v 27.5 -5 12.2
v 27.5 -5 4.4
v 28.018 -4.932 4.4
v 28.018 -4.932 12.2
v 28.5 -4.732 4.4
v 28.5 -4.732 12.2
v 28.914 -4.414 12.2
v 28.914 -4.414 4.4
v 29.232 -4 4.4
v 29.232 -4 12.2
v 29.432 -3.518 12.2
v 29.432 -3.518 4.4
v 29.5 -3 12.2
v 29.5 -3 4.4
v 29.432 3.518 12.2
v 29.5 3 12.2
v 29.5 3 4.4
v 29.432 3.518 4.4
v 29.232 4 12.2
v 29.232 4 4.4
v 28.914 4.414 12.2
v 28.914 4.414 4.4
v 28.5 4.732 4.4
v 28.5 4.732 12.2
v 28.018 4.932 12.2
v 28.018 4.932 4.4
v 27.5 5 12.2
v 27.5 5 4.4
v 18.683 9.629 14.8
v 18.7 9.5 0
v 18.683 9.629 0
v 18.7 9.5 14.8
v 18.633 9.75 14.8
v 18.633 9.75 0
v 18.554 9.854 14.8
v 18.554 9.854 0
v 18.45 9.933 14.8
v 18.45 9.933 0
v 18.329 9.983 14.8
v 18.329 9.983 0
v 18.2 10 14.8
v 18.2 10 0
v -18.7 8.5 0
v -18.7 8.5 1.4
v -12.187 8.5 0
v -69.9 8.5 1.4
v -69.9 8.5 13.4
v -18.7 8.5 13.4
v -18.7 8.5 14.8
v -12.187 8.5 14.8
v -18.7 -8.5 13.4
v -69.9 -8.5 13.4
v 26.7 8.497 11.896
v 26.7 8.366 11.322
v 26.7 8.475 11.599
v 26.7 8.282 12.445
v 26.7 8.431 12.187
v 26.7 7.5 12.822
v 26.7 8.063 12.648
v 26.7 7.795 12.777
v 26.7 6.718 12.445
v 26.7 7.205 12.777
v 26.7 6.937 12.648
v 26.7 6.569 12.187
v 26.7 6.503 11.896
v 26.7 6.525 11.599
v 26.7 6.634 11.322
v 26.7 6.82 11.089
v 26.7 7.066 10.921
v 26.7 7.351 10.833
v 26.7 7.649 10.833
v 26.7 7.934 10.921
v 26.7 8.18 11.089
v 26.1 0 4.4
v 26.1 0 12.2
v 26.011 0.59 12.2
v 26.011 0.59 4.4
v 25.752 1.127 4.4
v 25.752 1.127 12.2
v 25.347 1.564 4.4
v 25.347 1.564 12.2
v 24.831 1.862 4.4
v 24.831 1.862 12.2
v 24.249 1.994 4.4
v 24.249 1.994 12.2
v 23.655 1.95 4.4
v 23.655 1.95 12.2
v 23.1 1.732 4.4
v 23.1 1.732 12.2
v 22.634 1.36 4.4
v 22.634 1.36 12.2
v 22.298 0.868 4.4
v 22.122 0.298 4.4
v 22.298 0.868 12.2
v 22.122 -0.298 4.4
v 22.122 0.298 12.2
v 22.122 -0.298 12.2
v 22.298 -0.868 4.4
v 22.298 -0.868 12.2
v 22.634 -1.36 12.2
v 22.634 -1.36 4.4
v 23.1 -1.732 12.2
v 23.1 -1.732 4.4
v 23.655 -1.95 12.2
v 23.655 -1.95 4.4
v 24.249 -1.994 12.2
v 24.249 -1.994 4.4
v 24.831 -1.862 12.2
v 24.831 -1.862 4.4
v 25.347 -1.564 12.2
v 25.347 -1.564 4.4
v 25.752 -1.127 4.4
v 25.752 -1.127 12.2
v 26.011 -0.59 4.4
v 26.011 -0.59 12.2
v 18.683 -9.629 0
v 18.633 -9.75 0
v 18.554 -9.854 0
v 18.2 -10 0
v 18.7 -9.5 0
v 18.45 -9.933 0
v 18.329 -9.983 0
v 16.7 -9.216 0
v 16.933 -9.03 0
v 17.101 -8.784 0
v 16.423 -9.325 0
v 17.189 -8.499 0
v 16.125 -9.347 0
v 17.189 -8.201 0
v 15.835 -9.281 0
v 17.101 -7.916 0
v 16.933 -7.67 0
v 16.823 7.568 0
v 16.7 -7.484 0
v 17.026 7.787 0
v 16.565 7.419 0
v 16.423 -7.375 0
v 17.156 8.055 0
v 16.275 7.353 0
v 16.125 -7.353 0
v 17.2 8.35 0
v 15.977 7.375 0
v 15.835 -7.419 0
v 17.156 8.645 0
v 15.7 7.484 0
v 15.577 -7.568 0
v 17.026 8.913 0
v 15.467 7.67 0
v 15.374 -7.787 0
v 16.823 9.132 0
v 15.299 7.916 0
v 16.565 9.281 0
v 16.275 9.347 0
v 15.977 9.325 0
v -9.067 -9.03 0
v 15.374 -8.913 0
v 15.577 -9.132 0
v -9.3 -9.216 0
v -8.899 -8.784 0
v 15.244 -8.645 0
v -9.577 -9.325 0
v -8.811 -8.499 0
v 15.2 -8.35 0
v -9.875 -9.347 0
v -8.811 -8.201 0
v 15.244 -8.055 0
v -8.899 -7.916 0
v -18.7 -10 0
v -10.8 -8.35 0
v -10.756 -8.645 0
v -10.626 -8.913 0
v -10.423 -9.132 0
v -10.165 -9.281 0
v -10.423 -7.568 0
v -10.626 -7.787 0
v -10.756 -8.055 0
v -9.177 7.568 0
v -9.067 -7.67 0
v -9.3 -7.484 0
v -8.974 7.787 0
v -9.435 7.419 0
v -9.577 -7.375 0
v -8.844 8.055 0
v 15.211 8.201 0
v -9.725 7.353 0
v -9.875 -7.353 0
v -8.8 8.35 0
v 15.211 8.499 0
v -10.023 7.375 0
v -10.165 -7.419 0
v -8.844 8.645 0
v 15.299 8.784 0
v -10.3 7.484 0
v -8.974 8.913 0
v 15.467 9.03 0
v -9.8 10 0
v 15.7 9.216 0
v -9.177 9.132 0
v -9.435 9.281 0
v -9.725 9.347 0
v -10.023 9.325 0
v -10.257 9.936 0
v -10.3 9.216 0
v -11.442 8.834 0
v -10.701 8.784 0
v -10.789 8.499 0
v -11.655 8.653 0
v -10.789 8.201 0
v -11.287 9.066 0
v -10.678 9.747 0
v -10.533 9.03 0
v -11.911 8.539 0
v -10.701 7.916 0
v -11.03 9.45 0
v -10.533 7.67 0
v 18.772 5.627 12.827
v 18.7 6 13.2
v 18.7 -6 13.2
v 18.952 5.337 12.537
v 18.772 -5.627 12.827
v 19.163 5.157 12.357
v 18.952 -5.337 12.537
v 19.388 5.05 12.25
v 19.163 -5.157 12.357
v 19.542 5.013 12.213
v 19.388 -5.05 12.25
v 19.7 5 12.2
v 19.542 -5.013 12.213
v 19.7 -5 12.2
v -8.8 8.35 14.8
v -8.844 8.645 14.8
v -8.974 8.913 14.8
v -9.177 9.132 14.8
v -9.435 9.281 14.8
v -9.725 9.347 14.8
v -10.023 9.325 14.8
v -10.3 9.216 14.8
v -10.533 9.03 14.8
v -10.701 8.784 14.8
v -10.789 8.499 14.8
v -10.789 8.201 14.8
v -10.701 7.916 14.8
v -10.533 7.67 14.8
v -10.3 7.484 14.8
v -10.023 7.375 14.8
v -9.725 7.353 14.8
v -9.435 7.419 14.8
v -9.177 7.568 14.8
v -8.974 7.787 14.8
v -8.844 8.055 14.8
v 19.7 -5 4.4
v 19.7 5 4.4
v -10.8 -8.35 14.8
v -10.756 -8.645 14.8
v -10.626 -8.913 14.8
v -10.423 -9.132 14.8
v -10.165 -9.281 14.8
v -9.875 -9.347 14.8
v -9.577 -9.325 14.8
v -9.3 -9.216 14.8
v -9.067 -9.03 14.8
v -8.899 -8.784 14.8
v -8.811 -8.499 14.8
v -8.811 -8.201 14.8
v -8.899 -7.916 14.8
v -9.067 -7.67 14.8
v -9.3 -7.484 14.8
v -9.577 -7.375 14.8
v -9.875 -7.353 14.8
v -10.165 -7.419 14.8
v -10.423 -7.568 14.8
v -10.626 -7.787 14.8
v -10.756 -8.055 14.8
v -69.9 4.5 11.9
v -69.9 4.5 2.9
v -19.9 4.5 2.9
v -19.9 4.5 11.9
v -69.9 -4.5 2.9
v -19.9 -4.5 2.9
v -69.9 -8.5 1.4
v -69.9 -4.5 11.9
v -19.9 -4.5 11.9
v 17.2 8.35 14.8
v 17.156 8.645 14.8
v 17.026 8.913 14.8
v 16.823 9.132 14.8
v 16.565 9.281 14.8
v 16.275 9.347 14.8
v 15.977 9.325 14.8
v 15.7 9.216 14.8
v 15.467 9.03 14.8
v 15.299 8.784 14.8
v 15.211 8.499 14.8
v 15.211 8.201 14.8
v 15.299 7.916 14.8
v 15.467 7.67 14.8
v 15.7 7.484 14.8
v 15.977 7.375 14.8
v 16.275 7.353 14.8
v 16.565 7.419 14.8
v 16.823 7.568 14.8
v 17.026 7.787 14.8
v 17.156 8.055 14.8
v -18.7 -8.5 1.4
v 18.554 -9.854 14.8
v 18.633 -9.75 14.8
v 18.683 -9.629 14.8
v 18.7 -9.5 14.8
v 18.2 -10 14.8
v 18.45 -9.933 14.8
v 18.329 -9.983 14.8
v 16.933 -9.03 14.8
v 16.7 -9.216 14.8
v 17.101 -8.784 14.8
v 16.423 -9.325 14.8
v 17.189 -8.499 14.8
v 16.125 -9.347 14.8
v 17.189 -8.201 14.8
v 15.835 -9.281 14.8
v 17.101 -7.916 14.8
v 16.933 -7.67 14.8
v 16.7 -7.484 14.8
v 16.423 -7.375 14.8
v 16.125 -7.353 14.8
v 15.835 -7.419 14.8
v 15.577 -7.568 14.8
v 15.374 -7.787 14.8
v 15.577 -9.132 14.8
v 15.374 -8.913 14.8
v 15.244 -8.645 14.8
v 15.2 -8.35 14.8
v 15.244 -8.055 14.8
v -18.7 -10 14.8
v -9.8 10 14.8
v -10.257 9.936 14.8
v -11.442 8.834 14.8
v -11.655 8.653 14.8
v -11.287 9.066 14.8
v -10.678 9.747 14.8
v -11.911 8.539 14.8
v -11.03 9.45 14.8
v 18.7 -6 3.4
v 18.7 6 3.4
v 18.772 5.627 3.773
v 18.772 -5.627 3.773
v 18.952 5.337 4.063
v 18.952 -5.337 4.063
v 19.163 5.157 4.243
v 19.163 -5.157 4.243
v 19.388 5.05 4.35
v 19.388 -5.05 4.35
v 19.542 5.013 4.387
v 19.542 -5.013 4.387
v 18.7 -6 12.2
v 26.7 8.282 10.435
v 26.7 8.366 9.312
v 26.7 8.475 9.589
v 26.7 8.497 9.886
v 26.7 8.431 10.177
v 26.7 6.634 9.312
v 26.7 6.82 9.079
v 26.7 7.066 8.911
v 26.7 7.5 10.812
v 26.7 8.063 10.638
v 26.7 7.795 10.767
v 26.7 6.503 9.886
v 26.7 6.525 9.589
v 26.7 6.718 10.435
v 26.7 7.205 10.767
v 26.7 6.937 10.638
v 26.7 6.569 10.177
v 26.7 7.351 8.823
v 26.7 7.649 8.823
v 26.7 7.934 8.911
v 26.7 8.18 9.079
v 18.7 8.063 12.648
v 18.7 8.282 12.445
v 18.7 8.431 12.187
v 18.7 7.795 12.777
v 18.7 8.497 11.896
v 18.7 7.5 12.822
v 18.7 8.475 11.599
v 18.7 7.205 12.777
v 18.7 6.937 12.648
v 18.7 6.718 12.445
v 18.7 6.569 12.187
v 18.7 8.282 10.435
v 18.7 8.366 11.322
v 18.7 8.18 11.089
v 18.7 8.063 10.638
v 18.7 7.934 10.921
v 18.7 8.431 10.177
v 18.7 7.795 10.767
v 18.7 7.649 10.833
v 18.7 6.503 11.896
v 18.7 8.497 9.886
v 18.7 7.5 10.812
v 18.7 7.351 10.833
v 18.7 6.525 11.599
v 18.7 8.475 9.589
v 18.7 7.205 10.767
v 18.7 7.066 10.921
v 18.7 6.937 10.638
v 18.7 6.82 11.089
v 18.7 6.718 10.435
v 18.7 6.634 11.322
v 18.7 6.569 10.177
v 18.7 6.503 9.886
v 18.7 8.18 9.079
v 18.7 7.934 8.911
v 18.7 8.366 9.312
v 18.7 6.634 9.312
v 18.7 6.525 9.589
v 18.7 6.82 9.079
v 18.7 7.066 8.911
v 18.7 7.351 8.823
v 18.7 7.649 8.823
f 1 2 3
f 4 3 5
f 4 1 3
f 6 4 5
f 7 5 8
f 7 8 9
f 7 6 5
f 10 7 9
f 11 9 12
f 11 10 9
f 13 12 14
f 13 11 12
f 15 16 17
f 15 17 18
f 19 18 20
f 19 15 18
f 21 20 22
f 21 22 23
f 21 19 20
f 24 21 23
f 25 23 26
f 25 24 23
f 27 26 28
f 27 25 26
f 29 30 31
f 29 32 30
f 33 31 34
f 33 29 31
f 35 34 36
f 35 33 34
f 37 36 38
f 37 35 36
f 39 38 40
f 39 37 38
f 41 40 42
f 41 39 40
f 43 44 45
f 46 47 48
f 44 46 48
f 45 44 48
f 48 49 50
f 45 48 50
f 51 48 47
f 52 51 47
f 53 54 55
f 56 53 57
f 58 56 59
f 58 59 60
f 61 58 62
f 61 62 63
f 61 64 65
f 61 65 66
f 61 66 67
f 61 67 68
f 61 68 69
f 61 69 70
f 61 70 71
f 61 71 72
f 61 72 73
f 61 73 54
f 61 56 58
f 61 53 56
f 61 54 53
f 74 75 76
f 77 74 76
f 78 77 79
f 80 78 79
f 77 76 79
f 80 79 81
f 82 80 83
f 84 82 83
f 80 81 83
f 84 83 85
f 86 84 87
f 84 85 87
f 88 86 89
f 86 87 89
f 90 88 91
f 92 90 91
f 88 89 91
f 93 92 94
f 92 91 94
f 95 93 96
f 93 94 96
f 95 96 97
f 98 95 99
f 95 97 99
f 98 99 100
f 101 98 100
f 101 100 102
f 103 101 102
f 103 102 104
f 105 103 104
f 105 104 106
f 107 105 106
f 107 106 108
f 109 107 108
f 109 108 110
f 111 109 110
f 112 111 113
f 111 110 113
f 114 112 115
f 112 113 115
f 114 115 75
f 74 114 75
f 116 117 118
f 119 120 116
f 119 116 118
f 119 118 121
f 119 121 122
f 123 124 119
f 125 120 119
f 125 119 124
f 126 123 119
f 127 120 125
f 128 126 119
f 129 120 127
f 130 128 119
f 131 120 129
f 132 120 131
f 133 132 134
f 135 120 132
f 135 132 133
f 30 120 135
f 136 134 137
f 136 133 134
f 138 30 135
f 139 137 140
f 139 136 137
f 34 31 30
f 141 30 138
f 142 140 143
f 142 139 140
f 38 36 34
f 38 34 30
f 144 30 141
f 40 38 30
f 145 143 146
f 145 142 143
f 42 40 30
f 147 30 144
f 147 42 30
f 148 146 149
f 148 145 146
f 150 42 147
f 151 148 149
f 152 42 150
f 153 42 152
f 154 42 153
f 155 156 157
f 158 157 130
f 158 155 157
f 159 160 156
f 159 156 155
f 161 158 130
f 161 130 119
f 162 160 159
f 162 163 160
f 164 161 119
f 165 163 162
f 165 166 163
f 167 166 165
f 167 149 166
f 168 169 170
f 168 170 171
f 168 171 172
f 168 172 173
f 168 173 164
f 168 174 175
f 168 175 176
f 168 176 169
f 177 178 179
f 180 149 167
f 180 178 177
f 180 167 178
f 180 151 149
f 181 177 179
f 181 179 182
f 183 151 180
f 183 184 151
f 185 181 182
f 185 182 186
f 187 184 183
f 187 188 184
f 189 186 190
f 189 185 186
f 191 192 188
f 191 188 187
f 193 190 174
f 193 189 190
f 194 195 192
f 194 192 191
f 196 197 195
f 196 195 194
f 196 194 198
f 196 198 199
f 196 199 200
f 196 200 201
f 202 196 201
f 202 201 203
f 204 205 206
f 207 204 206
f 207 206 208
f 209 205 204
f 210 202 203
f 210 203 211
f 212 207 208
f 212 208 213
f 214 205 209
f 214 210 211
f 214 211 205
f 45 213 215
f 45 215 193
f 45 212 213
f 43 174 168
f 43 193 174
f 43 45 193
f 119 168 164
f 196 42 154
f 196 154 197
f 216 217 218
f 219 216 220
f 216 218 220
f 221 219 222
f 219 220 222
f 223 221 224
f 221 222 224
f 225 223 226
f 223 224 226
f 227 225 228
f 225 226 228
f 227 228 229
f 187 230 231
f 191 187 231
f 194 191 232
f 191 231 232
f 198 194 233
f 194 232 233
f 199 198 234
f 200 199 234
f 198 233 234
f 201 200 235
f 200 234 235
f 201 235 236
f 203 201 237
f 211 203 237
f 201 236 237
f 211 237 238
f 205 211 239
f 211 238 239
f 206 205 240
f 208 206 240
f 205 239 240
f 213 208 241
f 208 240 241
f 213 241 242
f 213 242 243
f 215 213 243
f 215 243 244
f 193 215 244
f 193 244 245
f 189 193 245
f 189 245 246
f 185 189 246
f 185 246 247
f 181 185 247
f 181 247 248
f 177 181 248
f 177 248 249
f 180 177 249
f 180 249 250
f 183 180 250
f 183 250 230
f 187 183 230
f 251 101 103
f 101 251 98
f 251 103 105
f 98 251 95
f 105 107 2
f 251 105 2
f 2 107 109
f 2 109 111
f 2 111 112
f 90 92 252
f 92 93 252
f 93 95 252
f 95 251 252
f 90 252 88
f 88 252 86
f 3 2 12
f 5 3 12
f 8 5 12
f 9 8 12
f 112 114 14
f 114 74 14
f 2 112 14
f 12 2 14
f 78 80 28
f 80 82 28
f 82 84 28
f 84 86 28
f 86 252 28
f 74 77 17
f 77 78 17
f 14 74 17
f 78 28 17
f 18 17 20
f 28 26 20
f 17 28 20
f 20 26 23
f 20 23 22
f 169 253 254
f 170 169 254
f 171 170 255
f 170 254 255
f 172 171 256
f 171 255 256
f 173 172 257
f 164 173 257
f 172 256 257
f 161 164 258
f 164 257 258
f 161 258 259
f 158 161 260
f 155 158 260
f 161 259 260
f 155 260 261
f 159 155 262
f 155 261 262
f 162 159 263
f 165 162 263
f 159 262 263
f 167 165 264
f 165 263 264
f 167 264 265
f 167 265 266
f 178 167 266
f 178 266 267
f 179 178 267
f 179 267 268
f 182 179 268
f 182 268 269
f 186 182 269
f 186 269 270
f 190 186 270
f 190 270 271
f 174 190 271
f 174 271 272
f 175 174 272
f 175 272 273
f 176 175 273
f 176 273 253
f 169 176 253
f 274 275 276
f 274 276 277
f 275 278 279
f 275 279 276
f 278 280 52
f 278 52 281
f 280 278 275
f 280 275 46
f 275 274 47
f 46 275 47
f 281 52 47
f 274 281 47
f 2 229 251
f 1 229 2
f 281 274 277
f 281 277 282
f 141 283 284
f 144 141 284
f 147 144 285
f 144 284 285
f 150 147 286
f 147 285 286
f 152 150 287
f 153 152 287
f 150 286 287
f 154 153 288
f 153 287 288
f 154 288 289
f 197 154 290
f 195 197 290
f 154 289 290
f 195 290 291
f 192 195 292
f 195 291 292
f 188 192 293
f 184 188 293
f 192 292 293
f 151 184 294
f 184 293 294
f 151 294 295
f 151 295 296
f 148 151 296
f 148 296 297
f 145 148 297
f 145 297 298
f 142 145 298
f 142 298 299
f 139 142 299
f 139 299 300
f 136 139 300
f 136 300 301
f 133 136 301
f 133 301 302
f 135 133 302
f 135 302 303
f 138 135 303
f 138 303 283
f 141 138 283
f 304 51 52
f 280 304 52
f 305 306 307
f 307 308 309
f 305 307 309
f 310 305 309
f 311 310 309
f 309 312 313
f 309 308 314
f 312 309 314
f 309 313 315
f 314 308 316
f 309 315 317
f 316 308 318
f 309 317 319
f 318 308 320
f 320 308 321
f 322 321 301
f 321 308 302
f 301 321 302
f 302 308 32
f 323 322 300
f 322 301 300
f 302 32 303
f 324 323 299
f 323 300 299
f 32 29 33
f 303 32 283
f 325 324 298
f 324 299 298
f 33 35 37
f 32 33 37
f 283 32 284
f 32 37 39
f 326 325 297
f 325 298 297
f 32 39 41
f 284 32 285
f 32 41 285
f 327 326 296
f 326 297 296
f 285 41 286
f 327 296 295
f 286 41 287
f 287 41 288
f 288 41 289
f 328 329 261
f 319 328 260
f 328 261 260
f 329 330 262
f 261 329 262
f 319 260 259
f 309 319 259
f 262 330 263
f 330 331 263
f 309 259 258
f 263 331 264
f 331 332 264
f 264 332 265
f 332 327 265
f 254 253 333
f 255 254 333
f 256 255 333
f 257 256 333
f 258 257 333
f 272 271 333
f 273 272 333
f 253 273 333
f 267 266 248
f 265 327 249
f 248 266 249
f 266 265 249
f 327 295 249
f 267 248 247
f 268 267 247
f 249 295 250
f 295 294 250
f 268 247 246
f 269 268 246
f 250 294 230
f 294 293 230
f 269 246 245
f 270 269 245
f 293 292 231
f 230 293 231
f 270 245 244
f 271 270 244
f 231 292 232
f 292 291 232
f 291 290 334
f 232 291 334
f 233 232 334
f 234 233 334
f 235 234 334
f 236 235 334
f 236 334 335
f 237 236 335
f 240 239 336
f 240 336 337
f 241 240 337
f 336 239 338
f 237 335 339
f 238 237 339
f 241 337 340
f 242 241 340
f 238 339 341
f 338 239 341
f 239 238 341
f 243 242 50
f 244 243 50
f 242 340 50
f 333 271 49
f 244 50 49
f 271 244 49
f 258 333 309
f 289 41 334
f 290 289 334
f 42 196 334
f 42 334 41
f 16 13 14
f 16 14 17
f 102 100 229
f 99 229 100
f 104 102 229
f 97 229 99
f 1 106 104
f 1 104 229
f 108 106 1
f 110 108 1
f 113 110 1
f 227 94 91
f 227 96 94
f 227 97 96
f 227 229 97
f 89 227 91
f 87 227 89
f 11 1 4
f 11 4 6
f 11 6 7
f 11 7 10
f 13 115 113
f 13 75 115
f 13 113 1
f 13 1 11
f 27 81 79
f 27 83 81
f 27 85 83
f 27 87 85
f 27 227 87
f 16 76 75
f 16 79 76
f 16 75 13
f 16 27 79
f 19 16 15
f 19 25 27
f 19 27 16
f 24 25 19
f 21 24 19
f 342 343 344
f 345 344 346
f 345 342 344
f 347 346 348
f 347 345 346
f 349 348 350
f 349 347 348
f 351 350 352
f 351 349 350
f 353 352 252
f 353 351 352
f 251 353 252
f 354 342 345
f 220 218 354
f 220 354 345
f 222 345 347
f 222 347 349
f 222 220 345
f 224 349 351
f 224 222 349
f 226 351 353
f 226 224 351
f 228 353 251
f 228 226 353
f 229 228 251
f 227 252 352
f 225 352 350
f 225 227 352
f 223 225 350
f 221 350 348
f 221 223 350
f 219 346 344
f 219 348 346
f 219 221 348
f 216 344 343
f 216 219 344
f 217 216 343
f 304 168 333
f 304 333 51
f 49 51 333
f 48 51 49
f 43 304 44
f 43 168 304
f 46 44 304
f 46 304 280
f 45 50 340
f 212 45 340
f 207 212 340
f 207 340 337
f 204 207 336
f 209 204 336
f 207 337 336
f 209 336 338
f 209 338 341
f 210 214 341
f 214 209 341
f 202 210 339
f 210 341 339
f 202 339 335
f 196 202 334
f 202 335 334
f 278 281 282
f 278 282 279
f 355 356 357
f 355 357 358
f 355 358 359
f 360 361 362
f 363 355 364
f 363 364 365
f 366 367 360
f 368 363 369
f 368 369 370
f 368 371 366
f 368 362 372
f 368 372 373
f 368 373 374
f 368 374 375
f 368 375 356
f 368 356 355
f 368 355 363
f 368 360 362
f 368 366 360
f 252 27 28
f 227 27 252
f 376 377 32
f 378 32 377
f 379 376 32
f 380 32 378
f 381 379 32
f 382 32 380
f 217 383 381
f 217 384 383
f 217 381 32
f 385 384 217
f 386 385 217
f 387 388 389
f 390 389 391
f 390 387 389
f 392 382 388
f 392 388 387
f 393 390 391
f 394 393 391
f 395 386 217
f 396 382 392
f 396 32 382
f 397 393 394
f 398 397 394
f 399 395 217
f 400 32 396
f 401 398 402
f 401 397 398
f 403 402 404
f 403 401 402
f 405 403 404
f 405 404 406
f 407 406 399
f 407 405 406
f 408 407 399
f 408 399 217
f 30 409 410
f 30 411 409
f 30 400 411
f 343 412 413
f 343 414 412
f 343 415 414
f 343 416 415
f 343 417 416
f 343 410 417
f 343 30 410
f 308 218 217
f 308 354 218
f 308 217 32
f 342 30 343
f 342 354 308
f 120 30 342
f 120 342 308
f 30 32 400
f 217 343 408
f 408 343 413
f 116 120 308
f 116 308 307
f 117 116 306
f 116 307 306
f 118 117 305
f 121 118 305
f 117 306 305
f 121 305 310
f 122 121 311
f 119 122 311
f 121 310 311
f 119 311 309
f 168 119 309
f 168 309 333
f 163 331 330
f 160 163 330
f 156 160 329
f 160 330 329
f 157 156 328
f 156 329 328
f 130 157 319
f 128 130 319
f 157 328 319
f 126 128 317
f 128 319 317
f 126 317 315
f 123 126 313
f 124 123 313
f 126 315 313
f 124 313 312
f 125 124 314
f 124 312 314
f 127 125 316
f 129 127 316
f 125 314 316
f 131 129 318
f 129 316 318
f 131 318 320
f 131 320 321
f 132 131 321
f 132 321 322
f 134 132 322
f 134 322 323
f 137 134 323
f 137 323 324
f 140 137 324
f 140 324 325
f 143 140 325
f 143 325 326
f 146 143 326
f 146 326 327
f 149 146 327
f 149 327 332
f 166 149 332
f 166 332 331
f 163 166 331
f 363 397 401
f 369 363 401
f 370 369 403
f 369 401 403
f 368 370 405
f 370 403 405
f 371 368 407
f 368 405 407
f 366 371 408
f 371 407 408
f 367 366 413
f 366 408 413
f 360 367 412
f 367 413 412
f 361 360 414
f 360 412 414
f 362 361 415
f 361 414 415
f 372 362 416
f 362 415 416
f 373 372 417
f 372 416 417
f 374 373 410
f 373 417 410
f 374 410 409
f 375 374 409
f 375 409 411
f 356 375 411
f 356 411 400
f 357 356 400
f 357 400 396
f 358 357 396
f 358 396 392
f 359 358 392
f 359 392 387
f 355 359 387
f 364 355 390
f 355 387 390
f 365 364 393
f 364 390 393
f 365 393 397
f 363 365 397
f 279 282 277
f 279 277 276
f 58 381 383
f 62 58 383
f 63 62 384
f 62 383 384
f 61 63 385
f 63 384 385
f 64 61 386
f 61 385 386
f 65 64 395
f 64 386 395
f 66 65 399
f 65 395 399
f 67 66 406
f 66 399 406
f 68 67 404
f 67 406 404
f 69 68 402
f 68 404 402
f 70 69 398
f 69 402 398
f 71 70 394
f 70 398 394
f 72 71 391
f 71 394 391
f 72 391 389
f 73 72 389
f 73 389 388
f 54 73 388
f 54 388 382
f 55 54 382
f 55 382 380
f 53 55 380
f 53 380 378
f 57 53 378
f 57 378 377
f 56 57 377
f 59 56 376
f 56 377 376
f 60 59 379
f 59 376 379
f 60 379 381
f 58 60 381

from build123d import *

# Parameters (mm, degrees)
BOSS_EXTRU_1_DEPTH      = 14.8
BOSS_EXTRU_2_START      = -2.6000000000000005
ESQUISSE2_R             = 2.000000000000003
BOSS_EXTRU_2_DEPTH      = 7.8
BOSS_EXTRU_3_START      = -1.4
BOSS_EXTRU_3_DEPTH      = 12
ENL_V_MAT_EXTRU_1_DEPTH = 50
CONG_1_R                = 1
CONG_2_R                = 1
ESQUISSE10_R            = 1.0000000000000018
ENL_V_MAT_EXTRU_2_DEPTH = 73.14603246194486
CONG_3_R                = 0.5
ESQUISSE11_R            = 1.0000000000000013
ESQUISSE11_R_2          = 0.9999999999999998
BOSS_EXTRU_5_DEPTH      = 8


with BuildPart() as part:
    # Esquisse1 → Boss.-Extru.1 (new body)
    with BuildSketch(Plane.XY):
        Polygon((-18.700000000000003, 10), (18.699999999999996, 10), (18.699999999999996, -10), (-18.7, -10), align=None)
    extrude(amount=BOSS_EXTRU_1_DEPTH)

    # Esquisse2 → Boss.-Extru.2 (add)
    with BuildSketch(Plane.XY.offset(14.8).offset(BOSS_EXTRU_2_START)):
        with BuildLine():
            Line((29.5, -3.0000000000000004), (29.5, 3.0000000000000004))
            ThreePointArc((29.5, 3.0000000000000004), (28.914213562373092, 4.414213562373096), (27.499999999999996, 4.999999999999998))
            Line((27.499999999999996, 5), (19.699999999999996, 5))
            ThreePointArc((19.699999999999996, 5.000000000000001), (18.99289321881345, 5.292893218813453), (18.699999999999996, 6))
            Line((18.699999999999996, 6), (18.699999999999996, 5))
            Line((18.699999999999996, 5.000000000000001), (18.699999999999996, -4.999999999999999))
            Line((18.699999999999996, -5), (18.699999999999996, -6))
            ThreePointArc((18.699999999999996, -6), (18.99289321881345, -5.292893218813453), (19.699999999999996, -5.000000000000001))
            Line((19.699999999999996, -5), (27.499999999999996, -5))
            ThreePointArc((27.499999999999996, -4.999999999999999), (28.914213562373096, -4.414213562373097), (29.5, -3.0000000000000004))
        make_face()
        with Locations((24.099999999999998, 0)):
            Circle(ESQUISSE2_R, mode=Mode.SUBTRACT)
    extrude(amount=-BOSS_EXTRU_2_DEPTH)

    # Esquisse4 → Boss.-Extru.3 (add)
    with BuildSketch(Plane.XY.offset(14.8).offset(BOSS_EXTRU_3_START)):
        Polygon((-69.9, 8.499999999999998), (-18.700000000000003, 8.499999999999998), (-18.700000000000003, -8.5), (-69.9, -8.499999999999998), align=None)
    extrude(amount=-BOSS_EXTRU_3_DEPTH)

    # Esquisse7 → Enlèv. mat.-Extru.1 (cut)
    with BuildSketch(Plane.ZY.offset(69.9)):
        Polygon((2.9000000000000026, 4.5), (11.9, 4.5), (11.900000000000004, -4.5), (2.9000000000000044, -4.5), align=None)
    extrude(amount=-ENL_V_MAT_EXTRU_1_DEPTH, mode=Mode.SUBTRACT)

    # Congé1
    cong_1_edges = [part.edges().sort_by_distance(p)[0] for p in [
        (18.699999999999996, 0, 4.4),
    ]]
    fillet(cong_1_edges, radius=CONG_1_R)

    # Congé2
    cong_2_edges = [part.edges().sort_by_distance(p)[0] for p in [
        (18.699999999999996, 0, 12.2),
    ]]
    fillet(cong_2_edges, radius=CONG_2_R)

    # Esquisse10 → Enlèv. mat.-Extru.2 (cut, through all)
    with BuildSketch(Plane.XY.offset(14.8)):
        with Locations((16.2, 8.35)):
            Circle(ESQUISSE10_R)
        with Locations((-9.800000000000002, 8.349999999999994)):
            Circle(ESQUISSE10_R)
        with Locations(Location((-9.80000000000001, -8.349999999999994, 0), (0, 0, 180))):
            Circle(ESQUISSE10_R)
        with Locations(Location((16.19999999999997, -8.35, 0), (0, 0, 180))):
            Circle(ESQUISSE10_R)
        with BuildLine():
            Line((-18.700000000000003, 8.499999999999998), (-12.187467277262673, 8.499999999999998))
            ThreePointArc((-12.187467277262673, 8.499999999999998), (-11.655472100663742, 8.653252616138984), (-11.286536229239028, 9.066037735849054))
            ThreePointArc((-11.286536229239028, 9.066037735849054), (-10.677792041388242, 9.747133183370671), (-9.800000000000002, 10))
            Line((-9.800000000000002, 10), (-18.700000000000003, 10))
            Line((-18.700000000000003, 10), (-18.700000000000003, 8.499999999999998))
        make_face()
    extrude(amount=-ENL_V_MAT_EXTRU_2_DEPTH, mode=Mode.SUBTRACT)

    # Congé3
    cong_3_edges = [part.edges().sort_by_distance(p)[0] for p in [
        (18.699999999999996, -10, 7.4),
        (18.699999999999996, 10, 7.4),
    ]]
    fillet(cong_3_edges, radius=CONG_3_R)

    # Esquisse11 → Boss.-Extru.5 (add)
    with BuildSketch(Plane(origin=(18.699999999999996, 0, 0), x_dir=(0, 0, -1), z_dir=(1, 0, 0))):
        with Locations(Location((-11.821599718382592, 7.5, 0), (0, 0, 180))):
            Circle(ESQUISSE11_R)
        with Locations(Location((-9.811599718382592, 7.5, 0), (0, 0, 180))):
            Circle(ESQUISSE11_R_2)
    extrude(amount=BOSS_EXTRU_5_DEPTH)


solid = part.part
